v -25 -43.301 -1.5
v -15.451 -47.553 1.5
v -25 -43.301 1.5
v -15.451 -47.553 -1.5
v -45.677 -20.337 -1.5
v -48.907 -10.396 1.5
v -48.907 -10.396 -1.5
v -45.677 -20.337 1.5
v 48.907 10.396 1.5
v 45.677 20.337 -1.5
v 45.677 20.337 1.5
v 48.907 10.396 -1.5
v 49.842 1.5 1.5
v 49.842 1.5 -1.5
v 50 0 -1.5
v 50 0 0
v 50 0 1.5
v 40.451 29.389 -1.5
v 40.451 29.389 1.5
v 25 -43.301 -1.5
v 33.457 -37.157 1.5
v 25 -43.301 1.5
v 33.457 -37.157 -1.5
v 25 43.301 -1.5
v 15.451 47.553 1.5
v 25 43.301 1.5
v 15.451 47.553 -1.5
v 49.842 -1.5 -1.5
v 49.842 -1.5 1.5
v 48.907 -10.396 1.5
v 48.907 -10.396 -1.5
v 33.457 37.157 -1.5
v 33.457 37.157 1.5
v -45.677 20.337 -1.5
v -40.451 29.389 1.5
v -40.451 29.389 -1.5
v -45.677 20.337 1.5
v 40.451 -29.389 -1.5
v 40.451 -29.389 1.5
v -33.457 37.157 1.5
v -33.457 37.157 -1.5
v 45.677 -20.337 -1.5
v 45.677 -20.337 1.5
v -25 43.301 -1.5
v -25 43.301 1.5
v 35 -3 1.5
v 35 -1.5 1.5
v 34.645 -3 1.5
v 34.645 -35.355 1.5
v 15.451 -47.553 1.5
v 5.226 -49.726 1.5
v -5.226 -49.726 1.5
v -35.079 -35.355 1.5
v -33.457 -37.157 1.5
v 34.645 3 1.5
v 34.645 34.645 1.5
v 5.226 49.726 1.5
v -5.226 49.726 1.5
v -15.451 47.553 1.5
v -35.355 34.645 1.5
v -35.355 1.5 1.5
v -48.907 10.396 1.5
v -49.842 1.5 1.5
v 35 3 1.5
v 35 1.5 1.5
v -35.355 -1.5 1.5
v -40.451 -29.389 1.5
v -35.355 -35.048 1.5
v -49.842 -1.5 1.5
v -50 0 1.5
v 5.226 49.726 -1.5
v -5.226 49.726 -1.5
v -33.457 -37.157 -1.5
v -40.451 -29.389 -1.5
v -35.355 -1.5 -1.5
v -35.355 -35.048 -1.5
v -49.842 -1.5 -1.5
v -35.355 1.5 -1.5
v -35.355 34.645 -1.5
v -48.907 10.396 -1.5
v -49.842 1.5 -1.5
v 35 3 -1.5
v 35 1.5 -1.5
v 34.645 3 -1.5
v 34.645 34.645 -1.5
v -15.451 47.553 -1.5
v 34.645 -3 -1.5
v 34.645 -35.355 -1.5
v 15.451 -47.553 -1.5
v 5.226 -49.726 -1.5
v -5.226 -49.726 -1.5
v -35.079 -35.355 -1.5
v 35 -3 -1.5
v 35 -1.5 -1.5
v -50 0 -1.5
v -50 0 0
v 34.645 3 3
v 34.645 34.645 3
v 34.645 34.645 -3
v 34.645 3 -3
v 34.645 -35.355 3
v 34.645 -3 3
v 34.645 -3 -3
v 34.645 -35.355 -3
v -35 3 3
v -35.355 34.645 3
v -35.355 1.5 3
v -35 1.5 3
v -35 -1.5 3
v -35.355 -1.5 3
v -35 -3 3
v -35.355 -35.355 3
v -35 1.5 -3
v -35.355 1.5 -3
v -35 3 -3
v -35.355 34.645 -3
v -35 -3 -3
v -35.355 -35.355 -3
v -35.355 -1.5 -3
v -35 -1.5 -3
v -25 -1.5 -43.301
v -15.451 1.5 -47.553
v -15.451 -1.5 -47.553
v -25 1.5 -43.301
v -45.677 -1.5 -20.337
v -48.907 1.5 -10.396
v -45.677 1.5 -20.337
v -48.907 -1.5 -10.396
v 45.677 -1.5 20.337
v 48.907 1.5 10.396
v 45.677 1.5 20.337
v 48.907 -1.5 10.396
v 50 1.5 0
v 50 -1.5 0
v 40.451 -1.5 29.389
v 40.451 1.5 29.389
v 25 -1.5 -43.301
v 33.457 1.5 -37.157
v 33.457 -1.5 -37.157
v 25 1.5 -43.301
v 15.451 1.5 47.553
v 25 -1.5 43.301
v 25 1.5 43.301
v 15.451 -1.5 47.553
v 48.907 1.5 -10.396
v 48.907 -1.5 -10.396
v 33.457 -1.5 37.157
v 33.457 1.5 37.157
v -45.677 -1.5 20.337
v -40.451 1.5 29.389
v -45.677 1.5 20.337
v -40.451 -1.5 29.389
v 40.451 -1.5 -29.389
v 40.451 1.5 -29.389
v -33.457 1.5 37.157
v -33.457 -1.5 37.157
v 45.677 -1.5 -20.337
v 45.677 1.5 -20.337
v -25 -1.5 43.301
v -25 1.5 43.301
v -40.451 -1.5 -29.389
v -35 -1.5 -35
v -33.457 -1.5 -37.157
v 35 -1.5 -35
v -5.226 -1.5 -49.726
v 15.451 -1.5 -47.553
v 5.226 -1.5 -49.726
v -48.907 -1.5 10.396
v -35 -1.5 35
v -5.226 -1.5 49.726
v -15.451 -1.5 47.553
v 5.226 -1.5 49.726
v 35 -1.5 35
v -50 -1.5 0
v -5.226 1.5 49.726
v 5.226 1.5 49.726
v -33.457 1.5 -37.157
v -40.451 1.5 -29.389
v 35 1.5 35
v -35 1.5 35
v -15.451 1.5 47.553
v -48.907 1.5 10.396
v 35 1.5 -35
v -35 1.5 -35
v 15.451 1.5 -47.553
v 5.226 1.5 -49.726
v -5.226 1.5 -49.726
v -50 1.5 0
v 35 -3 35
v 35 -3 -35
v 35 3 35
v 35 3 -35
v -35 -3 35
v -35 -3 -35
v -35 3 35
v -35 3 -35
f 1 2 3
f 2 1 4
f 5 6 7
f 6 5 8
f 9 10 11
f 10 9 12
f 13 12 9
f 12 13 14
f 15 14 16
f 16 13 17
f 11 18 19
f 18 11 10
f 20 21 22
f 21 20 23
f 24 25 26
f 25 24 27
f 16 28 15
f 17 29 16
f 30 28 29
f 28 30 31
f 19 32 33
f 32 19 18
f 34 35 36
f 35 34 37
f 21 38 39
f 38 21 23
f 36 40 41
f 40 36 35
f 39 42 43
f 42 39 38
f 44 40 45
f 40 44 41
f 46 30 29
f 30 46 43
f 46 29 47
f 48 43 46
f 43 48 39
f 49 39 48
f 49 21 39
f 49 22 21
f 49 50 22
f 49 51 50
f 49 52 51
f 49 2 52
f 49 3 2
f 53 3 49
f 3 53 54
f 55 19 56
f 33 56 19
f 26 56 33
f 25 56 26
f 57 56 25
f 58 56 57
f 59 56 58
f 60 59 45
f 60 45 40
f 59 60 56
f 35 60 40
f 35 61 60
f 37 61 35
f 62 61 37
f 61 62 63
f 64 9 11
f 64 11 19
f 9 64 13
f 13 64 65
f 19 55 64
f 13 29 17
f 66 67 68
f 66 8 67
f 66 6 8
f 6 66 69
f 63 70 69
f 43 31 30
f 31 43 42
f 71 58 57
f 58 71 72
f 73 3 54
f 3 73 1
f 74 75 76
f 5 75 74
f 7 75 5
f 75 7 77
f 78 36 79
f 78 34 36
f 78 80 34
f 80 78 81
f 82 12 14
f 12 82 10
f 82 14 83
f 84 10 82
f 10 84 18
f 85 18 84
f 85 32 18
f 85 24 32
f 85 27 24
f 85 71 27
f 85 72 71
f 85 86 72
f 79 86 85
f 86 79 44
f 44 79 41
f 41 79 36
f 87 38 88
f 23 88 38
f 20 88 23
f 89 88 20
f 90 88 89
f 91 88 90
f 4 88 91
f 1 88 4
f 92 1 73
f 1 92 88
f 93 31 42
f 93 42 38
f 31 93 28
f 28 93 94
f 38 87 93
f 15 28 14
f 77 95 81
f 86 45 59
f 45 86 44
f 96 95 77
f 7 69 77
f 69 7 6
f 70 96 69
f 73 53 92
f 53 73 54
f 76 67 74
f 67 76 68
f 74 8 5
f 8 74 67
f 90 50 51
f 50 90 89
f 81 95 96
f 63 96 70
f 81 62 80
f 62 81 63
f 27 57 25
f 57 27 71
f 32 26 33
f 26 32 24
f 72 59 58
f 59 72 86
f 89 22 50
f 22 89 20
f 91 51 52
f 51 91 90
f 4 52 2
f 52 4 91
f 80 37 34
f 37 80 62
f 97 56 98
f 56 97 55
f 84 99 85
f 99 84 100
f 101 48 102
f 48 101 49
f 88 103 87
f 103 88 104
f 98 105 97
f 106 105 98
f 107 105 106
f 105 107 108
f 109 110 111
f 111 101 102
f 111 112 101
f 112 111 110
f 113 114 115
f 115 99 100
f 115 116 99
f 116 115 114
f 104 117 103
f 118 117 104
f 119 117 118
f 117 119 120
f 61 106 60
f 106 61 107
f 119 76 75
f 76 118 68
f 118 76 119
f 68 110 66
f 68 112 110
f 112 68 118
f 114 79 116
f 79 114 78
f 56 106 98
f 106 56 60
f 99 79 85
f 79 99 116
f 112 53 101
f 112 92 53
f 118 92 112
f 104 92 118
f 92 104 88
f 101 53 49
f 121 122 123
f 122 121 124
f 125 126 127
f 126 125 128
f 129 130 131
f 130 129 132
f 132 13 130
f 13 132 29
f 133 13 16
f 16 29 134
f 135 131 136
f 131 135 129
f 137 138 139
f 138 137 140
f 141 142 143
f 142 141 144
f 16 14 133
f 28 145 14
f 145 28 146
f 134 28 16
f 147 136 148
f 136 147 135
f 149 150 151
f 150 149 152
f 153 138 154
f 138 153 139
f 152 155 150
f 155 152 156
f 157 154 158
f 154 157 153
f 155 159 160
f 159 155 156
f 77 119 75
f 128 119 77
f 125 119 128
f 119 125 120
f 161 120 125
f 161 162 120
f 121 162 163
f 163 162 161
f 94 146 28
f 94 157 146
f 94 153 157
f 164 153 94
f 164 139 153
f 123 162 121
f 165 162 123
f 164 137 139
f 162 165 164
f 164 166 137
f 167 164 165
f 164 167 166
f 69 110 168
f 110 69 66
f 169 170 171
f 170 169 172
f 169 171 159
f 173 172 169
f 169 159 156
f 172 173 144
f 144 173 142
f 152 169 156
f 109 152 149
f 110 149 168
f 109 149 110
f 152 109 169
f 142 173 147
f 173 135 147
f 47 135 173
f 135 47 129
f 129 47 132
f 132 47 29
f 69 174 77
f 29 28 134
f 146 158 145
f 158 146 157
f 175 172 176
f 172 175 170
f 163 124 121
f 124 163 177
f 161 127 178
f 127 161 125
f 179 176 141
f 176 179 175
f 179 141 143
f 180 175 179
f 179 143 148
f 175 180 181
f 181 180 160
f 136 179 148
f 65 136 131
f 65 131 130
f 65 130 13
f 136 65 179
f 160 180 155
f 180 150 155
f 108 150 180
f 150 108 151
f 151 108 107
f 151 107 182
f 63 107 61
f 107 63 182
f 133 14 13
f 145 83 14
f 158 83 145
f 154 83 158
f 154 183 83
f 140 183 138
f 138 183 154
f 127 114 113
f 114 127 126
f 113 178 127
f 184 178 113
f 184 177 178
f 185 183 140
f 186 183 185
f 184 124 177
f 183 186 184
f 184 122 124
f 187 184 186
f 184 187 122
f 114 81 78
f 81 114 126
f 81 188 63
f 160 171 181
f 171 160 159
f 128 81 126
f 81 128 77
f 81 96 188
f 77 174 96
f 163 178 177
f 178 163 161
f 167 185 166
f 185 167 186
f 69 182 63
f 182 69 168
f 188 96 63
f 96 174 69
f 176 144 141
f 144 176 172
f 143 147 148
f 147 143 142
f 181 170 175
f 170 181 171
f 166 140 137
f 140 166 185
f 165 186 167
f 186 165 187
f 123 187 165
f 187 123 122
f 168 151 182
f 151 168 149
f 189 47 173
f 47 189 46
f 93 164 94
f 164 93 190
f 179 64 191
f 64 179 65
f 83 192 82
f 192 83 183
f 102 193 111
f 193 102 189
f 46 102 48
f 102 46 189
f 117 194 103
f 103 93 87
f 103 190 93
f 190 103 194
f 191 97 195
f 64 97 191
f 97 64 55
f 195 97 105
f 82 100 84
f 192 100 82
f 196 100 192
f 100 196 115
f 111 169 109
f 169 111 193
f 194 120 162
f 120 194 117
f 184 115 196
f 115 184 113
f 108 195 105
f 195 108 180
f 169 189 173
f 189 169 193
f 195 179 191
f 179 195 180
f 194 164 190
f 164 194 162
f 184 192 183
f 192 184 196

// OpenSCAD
radius = 50;
size = 2 * radius * cos(45);
thickness = 3;

WhatsIt();
rotate([90, 0, 0]) WhatsItCentered();

module WhatsIt() {
	translate([0, 0, -thickness / 2]) cylinder(r = 50, h = thickness);
	translate([-size / 2, -size / 2, -thickness]) cube([70, 70, thickness * 2]);
}

module WhatsItCentered() {
	cylinder(r = 50, h = thickness, center = true);
	cube([70, 70, thickness * 2], center = true);
}
